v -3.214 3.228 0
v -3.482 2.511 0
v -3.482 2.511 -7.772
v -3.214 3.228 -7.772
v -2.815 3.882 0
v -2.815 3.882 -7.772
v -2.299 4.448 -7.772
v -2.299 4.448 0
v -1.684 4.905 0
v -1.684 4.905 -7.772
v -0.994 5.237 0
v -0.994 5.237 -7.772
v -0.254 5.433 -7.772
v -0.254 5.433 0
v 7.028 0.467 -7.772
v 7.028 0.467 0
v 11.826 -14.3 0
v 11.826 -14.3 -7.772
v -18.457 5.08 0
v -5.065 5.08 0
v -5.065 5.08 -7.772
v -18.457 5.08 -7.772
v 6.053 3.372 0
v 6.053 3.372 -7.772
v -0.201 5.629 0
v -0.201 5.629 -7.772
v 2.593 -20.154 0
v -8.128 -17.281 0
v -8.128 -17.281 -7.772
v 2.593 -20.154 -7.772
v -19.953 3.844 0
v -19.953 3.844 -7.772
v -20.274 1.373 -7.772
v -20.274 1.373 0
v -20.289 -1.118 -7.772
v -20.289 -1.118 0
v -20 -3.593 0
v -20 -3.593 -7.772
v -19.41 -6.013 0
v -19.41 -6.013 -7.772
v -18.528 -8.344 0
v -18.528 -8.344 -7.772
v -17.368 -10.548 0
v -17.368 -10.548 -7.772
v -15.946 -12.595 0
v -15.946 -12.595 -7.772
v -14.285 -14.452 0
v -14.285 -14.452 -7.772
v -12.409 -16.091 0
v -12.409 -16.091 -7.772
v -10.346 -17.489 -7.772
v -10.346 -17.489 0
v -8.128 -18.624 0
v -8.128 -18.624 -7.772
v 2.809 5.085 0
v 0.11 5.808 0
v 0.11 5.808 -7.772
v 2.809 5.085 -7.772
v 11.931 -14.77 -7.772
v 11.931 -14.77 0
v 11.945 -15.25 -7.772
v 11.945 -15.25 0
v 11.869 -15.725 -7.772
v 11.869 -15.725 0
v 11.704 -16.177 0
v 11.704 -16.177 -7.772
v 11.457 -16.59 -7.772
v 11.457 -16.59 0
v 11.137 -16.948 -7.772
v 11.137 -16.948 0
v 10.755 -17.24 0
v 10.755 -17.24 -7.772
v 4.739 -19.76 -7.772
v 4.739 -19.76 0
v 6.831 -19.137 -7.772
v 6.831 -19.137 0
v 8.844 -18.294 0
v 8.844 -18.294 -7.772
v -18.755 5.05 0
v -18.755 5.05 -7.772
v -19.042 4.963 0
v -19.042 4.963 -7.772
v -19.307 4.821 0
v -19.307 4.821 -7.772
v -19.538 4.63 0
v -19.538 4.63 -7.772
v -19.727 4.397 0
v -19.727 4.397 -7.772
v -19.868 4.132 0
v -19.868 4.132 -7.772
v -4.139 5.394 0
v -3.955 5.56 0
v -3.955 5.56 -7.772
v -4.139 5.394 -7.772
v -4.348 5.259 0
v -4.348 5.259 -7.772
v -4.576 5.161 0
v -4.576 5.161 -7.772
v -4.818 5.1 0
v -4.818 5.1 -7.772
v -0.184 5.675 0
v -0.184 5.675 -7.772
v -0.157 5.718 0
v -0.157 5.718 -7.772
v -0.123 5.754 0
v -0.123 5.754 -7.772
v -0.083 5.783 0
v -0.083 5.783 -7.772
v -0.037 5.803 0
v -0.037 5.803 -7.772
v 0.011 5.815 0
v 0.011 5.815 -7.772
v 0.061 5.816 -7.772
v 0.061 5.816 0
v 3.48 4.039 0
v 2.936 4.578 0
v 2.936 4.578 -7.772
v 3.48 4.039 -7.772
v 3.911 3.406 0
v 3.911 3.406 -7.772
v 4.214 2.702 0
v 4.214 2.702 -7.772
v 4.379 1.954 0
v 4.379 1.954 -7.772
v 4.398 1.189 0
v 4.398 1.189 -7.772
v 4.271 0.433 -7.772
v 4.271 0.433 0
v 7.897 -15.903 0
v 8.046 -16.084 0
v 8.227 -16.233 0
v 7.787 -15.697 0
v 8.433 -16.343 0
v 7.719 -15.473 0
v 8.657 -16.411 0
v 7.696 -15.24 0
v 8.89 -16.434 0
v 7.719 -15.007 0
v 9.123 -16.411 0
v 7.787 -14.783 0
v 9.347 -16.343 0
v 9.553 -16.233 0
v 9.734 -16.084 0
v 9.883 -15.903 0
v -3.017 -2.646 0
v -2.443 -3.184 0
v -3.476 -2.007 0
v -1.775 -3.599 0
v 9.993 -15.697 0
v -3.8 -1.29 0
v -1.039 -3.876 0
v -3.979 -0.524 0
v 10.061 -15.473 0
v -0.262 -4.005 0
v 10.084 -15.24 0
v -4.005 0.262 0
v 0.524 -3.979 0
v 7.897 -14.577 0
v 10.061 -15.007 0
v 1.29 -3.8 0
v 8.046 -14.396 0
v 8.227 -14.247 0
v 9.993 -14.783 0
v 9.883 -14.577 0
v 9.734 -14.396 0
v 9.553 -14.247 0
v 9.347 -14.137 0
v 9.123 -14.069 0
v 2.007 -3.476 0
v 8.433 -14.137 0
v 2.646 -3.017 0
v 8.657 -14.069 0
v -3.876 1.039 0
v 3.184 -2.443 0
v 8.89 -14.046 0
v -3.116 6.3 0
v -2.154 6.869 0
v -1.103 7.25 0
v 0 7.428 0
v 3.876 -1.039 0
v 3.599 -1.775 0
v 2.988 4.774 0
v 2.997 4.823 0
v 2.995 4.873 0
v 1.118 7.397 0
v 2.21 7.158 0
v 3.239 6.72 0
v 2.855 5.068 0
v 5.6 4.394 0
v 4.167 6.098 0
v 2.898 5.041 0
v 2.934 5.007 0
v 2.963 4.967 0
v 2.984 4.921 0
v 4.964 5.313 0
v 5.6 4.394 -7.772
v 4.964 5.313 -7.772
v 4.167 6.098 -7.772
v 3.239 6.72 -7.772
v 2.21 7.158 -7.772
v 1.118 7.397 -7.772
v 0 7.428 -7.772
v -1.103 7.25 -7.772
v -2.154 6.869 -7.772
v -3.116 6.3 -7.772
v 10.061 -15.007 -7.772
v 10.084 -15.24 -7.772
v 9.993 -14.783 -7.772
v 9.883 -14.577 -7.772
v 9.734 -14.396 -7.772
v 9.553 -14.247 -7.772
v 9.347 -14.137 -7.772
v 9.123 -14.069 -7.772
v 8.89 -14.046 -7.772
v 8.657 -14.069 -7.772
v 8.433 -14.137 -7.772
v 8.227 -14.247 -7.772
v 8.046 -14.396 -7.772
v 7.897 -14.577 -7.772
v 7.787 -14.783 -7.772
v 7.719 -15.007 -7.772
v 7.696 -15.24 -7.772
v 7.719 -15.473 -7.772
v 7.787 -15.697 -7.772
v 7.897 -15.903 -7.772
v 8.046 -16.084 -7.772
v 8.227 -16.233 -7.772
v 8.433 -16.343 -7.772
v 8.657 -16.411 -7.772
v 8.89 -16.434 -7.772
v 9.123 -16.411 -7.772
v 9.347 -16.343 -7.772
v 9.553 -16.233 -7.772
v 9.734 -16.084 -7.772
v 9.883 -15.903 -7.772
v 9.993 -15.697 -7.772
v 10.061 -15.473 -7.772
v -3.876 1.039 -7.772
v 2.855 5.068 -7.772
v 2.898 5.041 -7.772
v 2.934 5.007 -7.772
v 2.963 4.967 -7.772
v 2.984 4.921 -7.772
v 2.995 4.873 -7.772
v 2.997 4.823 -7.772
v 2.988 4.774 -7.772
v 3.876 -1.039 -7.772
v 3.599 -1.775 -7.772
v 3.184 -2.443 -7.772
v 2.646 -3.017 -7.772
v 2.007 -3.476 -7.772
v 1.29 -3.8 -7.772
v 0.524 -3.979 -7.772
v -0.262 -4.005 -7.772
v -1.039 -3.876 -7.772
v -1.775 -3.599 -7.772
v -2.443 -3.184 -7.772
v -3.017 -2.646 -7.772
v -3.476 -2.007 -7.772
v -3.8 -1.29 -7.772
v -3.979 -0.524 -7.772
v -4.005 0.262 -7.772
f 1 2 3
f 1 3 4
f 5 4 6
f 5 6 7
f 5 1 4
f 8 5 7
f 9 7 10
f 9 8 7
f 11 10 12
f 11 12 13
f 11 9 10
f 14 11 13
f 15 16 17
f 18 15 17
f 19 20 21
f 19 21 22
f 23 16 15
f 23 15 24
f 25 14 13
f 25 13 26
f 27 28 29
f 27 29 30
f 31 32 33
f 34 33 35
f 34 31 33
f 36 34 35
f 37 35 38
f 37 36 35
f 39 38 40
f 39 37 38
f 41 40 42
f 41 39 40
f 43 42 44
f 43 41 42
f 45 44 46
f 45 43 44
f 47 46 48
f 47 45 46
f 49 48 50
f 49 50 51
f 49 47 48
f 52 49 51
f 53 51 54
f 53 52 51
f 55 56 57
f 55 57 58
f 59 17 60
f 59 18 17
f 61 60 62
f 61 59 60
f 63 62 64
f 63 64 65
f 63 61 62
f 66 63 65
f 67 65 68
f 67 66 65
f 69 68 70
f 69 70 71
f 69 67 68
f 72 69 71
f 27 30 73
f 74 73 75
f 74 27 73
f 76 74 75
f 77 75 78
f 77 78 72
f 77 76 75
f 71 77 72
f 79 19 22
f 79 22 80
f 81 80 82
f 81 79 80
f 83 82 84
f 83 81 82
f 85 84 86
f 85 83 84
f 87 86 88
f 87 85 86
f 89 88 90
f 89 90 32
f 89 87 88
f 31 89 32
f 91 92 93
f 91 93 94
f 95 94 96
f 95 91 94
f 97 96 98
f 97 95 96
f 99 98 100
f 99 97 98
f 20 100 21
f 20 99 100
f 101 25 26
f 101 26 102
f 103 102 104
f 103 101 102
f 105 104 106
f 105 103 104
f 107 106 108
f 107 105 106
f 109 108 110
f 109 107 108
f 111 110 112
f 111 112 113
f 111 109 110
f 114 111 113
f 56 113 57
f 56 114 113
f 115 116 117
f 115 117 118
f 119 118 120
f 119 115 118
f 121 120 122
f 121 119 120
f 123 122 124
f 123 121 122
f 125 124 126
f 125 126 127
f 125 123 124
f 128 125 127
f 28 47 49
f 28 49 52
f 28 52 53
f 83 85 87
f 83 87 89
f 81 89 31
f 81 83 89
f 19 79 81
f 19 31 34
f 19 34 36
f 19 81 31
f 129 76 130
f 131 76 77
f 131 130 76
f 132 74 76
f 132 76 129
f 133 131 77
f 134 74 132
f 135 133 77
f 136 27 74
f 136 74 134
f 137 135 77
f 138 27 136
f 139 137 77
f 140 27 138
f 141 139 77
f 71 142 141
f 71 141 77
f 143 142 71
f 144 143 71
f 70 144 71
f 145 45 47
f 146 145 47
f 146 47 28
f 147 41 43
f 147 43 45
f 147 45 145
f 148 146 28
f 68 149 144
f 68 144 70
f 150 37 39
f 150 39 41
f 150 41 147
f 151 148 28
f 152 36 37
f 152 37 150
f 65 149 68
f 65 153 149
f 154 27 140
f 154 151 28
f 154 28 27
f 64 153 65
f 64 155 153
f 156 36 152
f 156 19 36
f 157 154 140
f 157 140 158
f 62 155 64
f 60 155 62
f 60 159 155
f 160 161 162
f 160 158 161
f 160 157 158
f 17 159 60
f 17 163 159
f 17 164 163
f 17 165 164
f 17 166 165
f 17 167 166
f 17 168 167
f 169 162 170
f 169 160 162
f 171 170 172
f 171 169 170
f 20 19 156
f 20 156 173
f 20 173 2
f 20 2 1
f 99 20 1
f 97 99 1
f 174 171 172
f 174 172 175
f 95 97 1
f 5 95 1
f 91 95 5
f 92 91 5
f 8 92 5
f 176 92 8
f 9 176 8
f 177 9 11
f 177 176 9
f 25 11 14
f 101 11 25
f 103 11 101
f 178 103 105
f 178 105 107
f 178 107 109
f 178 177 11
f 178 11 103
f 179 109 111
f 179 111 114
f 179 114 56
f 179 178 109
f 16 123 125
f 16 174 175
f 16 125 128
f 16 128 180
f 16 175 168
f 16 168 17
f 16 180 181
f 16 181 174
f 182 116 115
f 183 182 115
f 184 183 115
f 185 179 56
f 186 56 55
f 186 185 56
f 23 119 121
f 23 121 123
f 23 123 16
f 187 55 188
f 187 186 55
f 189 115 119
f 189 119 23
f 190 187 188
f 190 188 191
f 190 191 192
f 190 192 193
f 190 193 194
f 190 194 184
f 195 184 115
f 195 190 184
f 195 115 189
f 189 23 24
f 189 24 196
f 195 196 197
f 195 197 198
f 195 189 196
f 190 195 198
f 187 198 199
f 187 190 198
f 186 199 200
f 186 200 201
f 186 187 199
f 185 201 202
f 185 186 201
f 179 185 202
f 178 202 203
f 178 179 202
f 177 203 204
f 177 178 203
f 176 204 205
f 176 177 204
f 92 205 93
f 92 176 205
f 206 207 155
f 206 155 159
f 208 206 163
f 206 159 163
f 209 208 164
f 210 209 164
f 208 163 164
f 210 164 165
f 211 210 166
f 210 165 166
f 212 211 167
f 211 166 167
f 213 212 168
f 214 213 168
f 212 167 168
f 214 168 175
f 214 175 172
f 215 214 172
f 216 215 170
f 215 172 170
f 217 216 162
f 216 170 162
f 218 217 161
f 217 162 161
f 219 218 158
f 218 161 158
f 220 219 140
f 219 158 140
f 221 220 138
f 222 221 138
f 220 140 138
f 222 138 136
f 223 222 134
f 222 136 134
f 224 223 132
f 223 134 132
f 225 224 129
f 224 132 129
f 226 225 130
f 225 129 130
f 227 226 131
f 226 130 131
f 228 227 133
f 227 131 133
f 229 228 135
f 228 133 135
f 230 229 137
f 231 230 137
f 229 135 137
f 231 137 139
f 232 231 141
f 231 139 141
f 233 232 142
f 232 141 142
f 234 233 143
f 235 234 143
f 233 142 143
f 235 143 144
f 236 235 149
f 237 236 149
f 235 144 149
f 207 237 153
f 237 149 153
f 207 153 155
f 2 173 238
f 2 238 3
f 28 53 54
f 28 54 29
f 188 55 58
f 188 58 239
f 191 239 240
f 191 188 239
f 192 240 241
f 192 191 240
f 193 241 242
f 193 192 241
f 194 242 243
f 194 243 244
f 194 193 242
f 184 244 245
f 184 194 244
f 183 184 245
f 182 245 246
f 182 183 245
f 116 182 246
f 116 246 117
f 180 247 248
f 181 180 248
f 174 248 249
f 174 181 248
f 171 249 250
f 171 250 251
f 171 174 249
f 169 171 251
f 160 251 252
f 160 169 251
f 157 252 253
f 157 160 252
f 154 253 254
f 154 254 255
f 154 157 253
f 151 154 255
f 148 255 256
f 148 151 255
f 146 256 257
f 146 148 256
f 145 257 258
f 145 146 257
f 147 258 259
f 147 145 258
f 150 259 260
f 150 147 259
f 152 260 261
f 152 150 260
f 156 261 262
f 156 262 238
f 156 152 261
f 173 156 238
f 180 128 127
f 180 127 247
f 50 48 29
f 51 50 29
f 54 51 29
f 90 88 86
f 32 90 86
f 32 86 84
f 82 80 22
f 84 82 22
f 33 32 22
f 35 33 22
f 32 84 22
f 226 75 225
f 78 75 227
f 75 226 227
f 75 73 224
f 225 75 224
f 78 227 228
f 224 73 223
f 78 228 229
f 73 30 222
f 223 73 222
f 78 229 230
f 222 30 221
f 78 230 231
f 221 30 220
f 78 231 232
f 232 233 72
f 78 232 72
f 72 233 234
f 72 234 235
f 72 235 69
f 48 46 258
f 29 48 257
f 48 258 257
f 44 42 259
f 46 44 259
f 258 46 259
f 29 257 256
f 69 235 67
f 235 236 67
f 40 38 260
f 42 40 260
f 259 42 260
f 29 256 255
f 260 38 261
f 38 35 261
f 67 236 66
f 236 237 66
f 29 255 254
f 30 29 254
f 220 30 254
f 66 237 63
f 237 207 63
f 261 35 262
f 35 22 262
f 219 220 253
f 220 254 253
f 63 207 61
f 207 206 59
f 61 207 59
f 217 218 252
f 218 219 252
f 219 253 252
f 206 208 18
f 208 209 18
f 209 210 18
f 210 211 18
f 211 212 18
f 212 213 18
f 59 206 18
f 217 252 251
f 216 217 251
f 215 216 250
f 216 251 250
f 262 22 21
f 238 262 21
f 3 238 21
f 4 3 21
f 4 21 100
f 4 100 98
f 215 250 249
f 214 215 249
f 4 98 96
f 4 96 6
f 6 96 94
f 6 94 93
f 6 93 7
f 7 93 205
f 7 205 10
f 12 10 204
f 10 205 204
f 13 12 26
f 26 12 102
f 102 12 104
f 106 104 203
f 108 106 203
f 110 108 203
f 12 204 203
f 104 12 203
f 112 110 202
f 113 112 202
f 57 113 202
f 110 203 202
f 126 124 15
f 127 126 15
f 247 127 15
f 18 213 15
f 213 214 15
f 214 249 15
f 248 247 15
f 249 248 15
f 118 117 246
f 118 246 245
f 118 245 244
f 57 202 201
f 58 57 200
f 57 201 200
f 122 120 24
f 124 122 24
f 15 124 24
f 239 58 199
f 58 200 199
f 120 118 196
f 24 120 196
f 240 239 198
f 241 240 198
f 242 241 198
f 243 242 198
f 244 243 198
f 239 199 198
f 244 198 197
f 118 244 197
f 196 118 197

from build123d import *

# Parameters (mm, degrees)
SKETCH1_R               = 1.1938
BOSS_EXTRUDE1_DEPTH     = 7.7724
CUT_EXTRUDE1_DEPTH      = 1
CUT_EXTRUDE1_DEPTH_BACK = 8.7724
FILLET1_R               = 2.54


with BuildPart() as part:
    # Sketch1 → Boss-Extrude1 (new body)
    with BuildSketch(Plane.XY):
        with BuildLine():
            Line((-5.065262452, 5.08), (-18.456556559, 5.08))
            ThreePointArc((-18.456556559, 5.08), (-19.426909517, 4.731155792), (-19.953034117, 3.844324324))
            ThreePointArc((-19.953034117, 3.844324324), (-17.981598542, -9.463853015), (-8.128, -18.623587624))
            Line((-8.128, -18.623587624), (-8.128, -17.281160051))
            Line((-8.128, -17.281160051), (2.593084415, -20.153865962))
            ThreePointArc((2.593084415, -20.153865962), (10.900004065, -17.149119843), (17.146958643, -10.903403565))
            Line((17.146958643, -10.903403565), (12.940315476, -3.61728387))
            ThreePointArc((12.940315476, -3.61728387), (12.796393961, -3.475289825), (12.60008731, -3.426922378))
            ThreePointArc((12.60008731, -3.426922378), (9.17217903, -2.398369889), (7.028137334, 0.467212181))
            Line((7.028137334, 0.467212181), (6.053096787, 3.371693793))
            ThreePointArc((6.053096787, 3.371693793), (1.669604011, 7.303273092), (-3.95481445, 5.560217822))
            ThreePointArc((-3.95481445, 5.560217822), (-4.460344292, 5.205196933), (-5.065262452, 5.08))
        make_face()
        with Locations((8.89, -15.24)):
            Circle(SKETCH1_R, mode=Mode.SUBTRACT)
        with BuildLine():
            Line((-3.876453526, 1.038692592), (-3.482013301, 2.510763551))
            ThreePointArc((-3.482013301, 2.510763551), (-2.298514325, 4.447599489), (-0.253578298, 5.432607064))
            Line((-0.253578298, 5.432607064), (-0.201054745, 5.628627633))
            ThreePointArc((-0.201054745, 5.628627633), (-0.082709585, 5.782858048), (0.110030452, 5.808232755))
            Line((0.110030452, 5.808232755), (2.808827211, 5.085092343))
            ThreePointArc((2.808827211, 5.085092343), (2.963057626, 4.966747183), (2.988432333, 4.774007146))
            Line((2.988432333, 4.774007146), (2.93590878, 4.577986577))
            ThreePointArc((2.93590878, 4.577986577), (4.214371541, 2.702476981), (4.270893751, 0.433378367))
            Line((4.270893751, 0.433378367), (3.876453526, -1.038692592))
            ThreePointArc((3.876453526, -1.038692592), (-1.038692592, -3.876453526), (-3.876453526, 1.038692592))
        make_face(mode=Mode.SUBTRACT)
    extrude(amount=-BOSS_EXTRUDE1_DEPTH)

    # Sketch2 → Cut-Extrude1 (cut, two sides)
    with BuildSketch(Plane.XY) as cut_extrude1_sk:
        Polygon((-20.975210343, 86.652654313), (7.028137334, 0.467212181), (12.408372181, -16.091448034), (40.411719858, -102.276890166), (212.782604123, -46.270194811), (151.395673921, 142.659349668), align=None)
    extrude(amount=CUT_EXTRUDE1_DEPTH, mode=Mode.SUBTRACT)
    extrude(cut_extrude1_sk.sketch, amount=-CUT_EXTRUDE1_DEPTH_BACK, mode=Mode.SUBTRACT)

    # Fillet1
    fillet1_edges = [part.edges().sort_by_distance(p)[0] for p in [
        (12.408372181, -16.091448034, -3.8862),
    ]]
    fillet(fillet1_edges, radius=FILLET1_R)


solid = part.part
